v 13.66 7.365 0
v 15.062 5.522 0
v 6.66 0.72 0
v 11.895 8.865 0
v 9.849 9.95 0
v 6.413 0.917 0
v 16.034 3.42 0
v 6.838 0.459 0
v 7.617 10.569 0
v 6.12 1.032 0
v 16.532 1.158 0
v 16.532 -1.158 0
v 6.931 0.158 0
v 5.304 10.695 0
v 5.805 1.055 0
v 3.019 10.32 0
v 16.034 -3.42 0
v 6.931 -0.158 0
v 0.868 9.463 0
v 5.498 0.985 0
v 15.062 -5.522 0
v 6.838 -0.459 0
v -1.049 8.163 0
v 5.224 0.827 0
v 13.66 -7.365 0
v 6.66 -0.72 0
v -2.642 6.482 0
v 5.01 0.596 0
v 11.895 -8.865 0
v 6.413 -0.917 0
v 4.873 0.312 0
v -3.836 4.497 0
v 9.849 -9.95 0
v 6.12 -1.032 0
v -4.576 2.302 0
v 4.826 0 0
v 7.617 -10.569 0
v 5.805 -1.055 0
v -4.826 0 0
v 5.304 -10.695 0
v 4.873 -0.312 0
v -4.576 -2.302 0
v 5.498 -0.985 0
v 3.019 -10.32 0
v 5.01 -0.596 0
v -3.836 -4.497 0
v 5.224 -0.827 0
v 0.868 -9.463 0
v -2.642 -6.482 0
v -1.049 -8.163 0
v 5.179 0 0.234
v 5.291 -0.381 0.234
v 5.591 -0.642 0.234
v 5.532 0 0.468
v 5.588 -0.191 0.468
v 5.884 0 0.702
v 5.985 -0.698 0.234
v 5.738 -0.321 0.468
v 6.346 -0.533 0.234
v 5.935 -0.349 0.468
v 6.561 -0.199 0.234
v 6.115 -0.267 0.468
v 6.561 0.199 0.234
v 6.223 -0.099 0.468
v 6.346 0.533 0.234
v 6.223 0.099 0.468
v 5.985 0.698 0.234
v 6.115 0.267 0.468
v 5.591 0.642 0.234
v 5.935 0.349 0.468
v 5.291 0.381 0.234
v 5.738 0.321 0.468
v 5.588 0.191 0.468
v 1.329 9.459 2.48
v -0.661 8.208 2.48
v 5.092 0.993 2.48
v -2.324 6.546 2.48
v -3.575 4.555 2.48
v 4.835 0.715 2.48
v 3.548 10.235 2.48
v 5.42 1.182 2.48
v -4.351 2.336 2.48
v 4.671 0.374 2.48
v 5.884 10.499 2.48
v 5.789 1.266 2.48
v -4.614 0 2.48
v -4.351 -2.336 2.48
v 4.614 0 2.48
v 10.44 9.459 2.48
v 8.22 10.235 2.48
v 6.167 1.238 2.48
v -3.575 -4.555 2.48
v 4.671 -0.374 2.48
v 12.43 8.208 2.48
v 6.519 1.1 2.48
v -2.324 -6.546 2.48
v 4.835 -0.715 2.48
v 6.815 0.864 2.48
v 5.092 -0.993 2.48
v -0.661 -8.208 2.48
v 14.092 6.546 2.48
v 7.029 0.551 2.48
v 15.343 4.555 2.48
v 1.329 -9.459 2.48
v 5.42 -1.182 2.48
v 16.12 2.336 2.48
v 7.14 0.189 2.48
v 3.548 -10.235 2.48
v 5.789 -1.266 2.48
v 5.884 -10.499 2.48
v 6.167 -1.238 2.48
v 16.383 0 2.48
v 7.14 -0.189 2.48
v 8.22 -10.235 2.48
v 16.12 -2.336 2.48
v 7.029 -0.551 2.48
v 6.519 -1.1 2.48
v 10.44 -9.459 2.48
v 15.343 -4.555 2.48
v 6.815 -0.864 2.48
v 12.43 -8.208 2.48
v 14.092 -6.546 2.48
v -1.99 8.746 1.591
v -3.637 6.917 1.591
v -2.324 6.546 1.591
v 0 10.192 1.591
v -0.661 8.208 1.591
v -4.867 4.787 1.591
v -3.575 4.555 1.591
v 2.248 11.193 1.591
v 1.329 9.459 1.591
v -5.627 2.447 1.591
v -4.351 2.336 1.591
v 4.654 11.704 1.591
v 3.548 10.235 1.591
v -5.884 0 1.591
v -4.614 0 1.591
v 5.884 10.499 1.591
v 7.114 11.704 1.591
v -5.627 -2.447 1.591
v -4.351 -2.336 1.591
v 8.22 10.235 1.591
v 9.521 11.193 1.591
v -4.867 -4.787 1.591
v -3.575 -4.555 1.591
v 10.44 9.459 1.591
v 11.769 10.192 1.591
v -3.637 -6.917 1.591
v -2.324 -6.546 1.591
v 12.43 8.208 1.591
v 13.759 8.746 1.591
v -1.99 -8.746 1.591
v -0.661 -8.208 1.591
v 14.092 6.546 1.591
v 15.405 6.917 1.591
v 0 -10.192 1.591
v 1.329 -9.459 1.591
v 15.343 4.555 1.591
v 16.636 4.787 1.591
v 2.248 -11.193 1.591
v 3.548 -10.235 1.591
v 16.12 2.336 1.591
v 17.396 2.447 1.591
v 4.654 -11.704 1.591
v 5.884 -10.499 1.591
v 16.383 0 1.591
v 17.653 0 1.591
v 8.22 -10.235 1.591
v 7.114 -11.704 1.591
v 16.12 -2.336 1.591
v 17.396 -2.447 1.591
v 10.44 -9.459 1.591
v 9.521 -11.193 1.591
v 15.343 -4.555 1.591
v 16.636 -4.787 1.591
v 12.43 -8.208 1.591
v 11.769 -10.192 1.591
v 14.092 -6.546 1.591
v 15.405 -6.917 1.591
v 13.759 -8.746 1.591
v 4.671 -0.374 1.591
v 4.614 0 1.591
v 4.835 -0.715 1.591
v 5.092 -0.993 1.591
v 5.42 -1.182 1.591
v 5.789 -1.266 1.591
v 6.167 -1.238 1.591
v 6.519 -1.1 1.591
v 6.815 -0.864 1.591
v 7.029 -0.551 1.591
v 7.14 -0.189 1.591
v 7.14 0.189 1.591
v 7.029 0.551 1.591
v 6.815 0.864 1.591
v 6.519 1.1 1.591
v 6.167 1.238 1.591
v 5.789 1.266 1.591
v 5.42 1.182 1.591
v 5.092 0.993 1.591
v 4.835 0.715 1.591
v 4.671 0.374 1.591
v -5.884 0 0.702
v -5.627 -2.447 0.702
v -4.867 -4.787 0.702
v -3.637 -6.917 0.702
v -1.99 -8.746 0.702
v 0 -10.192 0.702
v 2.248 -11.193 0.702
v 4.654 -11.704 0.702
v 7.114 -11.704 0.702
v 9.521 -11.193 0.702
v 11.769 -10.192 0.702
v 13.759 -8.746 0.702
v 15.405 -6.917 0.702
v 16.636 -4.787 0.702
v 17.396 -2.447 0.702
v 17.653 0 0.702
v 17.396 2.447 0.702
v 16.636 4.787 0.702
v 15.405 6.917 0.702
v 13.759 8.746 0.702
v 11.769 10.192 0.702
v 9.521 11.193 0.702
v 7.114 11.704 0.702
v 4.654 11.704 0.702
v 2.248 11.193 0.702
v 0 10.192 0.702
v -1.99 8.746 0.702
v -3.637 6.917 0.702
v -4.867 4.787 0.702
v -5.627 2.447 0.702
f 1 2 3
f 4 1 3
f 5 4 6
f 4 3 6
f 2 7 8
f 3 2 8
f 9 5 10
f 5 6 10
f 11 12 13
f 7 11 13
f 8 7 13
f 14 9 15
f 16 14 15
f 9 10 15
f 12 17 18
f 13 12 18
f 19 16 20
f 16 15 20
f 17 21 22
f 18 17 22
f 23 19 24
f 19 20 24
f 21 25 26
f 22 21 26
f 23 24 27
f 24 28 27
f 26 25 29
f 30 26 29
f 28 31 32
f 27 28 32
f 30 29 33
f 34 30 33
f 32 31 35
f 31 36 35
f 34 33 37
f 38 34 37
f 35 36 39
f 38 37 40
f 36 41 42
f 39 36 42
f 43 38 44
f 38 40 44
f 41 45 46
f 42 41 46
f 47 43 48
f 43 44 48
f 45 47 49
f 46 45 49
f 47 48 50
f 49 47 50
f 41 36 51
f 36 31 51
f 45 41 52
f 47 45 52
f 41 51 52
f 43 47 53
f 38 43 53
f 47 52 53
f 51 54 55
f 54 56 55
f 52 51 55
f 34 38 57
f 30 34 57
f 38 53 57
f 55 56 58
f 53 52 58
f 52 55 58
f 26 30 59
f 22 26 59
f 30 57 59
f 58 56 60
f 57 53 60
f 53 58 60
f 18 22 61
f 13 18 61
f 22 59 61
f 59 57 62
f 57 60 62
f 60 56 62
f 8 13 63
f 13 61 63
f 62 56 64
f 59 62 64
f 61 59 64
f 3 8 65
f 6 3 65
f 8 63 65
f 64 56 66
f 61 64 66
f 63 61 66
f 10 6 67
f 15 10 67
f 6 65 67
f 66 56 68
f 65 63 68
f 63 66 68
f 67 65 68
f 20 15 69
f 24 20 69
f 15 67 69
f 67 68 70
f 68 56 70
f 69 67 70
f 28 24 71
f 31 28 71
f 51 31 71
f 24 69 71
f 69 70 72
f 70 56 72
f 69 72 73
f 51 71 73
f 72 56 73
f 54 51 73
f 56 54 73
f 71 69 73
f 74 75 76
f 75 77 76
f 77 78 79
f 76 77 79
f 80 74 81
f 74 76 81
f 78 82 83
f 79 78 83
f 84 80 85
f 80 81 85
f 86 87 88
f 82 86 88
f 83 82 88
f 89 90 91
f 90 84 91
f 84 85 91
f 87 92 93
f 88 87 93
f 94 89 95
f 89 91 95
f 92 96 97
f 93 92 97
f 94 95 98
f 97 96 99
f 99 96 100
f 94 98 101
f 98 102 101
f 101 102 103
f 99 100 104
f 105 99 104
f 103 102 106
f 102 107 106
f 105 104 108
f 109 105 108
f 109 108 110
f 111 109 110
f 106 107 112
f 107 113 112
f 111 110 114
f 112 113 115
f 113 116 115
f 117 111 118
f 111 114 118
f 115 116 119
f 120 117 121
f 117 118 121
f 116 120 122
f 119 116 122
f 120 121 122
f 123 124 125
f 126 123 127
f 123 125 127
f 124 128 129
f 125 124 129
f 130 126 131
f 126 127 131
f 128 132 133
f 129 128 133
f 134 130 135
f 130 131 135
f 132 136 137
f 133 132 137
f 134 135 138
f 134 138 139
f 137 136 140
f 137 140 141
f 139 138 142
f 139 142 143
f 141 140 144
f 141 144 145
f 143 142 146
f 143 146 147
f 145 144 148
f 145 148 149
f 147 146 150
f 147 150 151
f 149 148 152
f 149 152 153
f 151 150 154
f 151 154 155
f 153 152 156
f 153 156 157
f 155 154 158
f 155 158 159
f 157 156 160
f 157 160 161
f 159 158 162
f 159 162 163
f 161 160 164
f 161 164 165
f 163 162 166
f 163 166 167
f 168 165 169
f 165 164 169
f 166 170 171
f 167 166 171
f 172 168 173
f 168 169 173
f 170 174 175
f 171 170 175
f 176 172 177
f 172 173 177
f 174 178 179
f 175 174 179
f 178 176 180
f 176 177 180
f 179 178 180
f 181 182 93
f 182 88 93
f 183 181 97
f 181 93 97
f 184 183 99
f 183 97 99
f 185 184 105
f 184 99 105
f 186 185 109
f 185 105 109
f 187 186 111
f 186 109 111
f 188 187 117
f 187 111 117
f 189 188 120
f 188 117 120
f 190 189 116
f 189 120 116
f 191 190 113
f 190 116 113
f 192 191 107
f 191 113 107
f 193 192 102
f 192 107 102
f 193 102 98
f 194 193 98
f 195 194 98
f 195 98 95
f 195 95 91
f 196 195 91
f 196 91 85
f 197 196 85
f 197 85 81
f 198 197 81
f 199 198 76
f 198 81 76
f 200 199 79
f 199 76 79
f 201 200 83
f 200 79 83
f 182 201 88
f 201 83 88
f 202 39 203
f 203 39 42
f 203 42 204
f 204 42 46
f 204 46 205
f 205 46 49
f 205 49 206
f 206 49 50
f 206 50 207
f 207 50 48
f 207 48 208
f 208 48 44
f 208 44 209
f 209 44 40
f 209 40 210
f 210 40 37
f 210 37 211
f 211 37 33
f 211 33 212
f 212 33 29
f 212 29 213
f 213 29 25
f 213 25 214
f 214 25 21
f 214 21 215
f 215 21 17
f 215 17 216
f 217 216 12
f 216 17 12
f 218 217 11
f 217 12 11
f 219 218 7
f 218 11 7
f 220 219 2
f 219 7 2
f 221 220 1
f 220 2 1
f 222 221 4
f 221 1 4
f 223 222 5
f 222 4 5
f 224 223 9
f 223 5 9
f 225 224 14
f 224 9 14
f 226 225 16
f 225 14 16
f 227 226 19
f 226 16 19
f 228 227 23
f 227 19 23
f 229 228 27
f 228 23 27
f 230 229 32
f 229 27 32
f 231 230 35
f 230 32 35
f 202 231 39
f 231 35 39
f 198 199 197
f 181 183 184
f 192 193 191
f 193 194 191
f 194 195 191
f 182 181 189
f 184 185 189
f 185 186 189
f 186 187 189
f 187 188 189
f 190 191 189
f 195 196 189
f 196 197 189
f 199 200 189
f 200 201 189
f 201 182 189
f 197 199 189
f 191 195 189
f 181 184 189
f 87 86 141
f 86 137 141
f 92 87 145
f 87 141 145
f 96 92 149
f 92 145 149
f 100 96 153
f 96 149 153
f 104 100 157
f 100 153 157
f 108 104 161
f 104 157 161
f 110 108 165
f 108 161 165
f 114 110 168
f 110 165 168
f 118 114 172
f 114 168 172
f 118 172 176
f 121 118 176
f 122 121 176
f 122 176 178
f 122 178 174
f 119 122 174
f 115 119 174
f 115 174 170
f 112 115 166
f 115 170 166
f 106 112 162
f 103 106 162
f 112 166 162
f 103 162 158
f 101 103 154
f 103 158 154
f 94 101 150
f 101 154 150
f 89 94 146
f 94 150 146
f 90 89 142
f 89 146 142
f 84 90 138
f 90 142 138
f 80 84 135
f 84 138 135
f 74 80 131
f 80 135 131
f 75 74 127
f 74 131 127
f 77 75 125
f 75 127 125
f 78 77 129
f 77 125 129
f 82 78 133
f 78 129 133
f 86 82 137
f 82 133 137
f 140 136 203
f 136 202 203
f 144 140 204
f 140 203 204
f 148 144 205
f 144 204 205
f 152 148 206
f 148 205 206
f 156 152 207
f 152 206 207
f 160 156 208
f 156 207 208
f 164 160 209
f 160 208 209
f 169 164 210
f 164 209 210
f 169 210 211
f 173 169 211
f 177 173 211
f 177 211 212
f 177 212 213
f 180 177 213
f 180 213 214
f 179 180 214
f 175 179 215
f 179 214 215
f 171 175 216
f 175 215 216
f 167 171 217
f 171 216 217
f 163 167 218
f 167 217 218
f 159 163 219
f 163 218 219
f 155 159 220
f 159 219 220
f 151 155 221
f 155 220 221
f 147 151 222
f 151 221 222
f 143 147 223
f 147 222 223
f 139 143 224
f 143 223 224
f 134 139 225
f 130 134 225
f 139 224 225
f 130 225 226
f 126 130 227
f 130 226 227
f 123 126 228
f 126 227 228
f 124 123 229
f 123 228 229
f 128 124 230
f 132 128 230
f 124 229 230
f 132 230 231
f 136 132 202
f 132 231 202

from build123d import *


with BuildPart() as f1:
    # F0 (on Front) → F1 (revolve)
    with BuildSketch(Plane.XZ):
        Polygon((0, 2.480038), (0, 0), (4.826, 0), (5.884321, 0.702038), (5.884321, 1.591038), (4.614321, 1.591038), (4.614321, 2.480038), align=None)
        Polygon((-4.826, 0), (0, 0), (0, 2.480038), (-4.614321, 2.480038), (-4.614321, 1.591038), (-5.884321, 1.591038), (-5.884321, 0.702038), align=None)
    revolve(axis=Axis((5.884321, 0, 1.146538), (0, 0, 1)))


solid = f1.part
